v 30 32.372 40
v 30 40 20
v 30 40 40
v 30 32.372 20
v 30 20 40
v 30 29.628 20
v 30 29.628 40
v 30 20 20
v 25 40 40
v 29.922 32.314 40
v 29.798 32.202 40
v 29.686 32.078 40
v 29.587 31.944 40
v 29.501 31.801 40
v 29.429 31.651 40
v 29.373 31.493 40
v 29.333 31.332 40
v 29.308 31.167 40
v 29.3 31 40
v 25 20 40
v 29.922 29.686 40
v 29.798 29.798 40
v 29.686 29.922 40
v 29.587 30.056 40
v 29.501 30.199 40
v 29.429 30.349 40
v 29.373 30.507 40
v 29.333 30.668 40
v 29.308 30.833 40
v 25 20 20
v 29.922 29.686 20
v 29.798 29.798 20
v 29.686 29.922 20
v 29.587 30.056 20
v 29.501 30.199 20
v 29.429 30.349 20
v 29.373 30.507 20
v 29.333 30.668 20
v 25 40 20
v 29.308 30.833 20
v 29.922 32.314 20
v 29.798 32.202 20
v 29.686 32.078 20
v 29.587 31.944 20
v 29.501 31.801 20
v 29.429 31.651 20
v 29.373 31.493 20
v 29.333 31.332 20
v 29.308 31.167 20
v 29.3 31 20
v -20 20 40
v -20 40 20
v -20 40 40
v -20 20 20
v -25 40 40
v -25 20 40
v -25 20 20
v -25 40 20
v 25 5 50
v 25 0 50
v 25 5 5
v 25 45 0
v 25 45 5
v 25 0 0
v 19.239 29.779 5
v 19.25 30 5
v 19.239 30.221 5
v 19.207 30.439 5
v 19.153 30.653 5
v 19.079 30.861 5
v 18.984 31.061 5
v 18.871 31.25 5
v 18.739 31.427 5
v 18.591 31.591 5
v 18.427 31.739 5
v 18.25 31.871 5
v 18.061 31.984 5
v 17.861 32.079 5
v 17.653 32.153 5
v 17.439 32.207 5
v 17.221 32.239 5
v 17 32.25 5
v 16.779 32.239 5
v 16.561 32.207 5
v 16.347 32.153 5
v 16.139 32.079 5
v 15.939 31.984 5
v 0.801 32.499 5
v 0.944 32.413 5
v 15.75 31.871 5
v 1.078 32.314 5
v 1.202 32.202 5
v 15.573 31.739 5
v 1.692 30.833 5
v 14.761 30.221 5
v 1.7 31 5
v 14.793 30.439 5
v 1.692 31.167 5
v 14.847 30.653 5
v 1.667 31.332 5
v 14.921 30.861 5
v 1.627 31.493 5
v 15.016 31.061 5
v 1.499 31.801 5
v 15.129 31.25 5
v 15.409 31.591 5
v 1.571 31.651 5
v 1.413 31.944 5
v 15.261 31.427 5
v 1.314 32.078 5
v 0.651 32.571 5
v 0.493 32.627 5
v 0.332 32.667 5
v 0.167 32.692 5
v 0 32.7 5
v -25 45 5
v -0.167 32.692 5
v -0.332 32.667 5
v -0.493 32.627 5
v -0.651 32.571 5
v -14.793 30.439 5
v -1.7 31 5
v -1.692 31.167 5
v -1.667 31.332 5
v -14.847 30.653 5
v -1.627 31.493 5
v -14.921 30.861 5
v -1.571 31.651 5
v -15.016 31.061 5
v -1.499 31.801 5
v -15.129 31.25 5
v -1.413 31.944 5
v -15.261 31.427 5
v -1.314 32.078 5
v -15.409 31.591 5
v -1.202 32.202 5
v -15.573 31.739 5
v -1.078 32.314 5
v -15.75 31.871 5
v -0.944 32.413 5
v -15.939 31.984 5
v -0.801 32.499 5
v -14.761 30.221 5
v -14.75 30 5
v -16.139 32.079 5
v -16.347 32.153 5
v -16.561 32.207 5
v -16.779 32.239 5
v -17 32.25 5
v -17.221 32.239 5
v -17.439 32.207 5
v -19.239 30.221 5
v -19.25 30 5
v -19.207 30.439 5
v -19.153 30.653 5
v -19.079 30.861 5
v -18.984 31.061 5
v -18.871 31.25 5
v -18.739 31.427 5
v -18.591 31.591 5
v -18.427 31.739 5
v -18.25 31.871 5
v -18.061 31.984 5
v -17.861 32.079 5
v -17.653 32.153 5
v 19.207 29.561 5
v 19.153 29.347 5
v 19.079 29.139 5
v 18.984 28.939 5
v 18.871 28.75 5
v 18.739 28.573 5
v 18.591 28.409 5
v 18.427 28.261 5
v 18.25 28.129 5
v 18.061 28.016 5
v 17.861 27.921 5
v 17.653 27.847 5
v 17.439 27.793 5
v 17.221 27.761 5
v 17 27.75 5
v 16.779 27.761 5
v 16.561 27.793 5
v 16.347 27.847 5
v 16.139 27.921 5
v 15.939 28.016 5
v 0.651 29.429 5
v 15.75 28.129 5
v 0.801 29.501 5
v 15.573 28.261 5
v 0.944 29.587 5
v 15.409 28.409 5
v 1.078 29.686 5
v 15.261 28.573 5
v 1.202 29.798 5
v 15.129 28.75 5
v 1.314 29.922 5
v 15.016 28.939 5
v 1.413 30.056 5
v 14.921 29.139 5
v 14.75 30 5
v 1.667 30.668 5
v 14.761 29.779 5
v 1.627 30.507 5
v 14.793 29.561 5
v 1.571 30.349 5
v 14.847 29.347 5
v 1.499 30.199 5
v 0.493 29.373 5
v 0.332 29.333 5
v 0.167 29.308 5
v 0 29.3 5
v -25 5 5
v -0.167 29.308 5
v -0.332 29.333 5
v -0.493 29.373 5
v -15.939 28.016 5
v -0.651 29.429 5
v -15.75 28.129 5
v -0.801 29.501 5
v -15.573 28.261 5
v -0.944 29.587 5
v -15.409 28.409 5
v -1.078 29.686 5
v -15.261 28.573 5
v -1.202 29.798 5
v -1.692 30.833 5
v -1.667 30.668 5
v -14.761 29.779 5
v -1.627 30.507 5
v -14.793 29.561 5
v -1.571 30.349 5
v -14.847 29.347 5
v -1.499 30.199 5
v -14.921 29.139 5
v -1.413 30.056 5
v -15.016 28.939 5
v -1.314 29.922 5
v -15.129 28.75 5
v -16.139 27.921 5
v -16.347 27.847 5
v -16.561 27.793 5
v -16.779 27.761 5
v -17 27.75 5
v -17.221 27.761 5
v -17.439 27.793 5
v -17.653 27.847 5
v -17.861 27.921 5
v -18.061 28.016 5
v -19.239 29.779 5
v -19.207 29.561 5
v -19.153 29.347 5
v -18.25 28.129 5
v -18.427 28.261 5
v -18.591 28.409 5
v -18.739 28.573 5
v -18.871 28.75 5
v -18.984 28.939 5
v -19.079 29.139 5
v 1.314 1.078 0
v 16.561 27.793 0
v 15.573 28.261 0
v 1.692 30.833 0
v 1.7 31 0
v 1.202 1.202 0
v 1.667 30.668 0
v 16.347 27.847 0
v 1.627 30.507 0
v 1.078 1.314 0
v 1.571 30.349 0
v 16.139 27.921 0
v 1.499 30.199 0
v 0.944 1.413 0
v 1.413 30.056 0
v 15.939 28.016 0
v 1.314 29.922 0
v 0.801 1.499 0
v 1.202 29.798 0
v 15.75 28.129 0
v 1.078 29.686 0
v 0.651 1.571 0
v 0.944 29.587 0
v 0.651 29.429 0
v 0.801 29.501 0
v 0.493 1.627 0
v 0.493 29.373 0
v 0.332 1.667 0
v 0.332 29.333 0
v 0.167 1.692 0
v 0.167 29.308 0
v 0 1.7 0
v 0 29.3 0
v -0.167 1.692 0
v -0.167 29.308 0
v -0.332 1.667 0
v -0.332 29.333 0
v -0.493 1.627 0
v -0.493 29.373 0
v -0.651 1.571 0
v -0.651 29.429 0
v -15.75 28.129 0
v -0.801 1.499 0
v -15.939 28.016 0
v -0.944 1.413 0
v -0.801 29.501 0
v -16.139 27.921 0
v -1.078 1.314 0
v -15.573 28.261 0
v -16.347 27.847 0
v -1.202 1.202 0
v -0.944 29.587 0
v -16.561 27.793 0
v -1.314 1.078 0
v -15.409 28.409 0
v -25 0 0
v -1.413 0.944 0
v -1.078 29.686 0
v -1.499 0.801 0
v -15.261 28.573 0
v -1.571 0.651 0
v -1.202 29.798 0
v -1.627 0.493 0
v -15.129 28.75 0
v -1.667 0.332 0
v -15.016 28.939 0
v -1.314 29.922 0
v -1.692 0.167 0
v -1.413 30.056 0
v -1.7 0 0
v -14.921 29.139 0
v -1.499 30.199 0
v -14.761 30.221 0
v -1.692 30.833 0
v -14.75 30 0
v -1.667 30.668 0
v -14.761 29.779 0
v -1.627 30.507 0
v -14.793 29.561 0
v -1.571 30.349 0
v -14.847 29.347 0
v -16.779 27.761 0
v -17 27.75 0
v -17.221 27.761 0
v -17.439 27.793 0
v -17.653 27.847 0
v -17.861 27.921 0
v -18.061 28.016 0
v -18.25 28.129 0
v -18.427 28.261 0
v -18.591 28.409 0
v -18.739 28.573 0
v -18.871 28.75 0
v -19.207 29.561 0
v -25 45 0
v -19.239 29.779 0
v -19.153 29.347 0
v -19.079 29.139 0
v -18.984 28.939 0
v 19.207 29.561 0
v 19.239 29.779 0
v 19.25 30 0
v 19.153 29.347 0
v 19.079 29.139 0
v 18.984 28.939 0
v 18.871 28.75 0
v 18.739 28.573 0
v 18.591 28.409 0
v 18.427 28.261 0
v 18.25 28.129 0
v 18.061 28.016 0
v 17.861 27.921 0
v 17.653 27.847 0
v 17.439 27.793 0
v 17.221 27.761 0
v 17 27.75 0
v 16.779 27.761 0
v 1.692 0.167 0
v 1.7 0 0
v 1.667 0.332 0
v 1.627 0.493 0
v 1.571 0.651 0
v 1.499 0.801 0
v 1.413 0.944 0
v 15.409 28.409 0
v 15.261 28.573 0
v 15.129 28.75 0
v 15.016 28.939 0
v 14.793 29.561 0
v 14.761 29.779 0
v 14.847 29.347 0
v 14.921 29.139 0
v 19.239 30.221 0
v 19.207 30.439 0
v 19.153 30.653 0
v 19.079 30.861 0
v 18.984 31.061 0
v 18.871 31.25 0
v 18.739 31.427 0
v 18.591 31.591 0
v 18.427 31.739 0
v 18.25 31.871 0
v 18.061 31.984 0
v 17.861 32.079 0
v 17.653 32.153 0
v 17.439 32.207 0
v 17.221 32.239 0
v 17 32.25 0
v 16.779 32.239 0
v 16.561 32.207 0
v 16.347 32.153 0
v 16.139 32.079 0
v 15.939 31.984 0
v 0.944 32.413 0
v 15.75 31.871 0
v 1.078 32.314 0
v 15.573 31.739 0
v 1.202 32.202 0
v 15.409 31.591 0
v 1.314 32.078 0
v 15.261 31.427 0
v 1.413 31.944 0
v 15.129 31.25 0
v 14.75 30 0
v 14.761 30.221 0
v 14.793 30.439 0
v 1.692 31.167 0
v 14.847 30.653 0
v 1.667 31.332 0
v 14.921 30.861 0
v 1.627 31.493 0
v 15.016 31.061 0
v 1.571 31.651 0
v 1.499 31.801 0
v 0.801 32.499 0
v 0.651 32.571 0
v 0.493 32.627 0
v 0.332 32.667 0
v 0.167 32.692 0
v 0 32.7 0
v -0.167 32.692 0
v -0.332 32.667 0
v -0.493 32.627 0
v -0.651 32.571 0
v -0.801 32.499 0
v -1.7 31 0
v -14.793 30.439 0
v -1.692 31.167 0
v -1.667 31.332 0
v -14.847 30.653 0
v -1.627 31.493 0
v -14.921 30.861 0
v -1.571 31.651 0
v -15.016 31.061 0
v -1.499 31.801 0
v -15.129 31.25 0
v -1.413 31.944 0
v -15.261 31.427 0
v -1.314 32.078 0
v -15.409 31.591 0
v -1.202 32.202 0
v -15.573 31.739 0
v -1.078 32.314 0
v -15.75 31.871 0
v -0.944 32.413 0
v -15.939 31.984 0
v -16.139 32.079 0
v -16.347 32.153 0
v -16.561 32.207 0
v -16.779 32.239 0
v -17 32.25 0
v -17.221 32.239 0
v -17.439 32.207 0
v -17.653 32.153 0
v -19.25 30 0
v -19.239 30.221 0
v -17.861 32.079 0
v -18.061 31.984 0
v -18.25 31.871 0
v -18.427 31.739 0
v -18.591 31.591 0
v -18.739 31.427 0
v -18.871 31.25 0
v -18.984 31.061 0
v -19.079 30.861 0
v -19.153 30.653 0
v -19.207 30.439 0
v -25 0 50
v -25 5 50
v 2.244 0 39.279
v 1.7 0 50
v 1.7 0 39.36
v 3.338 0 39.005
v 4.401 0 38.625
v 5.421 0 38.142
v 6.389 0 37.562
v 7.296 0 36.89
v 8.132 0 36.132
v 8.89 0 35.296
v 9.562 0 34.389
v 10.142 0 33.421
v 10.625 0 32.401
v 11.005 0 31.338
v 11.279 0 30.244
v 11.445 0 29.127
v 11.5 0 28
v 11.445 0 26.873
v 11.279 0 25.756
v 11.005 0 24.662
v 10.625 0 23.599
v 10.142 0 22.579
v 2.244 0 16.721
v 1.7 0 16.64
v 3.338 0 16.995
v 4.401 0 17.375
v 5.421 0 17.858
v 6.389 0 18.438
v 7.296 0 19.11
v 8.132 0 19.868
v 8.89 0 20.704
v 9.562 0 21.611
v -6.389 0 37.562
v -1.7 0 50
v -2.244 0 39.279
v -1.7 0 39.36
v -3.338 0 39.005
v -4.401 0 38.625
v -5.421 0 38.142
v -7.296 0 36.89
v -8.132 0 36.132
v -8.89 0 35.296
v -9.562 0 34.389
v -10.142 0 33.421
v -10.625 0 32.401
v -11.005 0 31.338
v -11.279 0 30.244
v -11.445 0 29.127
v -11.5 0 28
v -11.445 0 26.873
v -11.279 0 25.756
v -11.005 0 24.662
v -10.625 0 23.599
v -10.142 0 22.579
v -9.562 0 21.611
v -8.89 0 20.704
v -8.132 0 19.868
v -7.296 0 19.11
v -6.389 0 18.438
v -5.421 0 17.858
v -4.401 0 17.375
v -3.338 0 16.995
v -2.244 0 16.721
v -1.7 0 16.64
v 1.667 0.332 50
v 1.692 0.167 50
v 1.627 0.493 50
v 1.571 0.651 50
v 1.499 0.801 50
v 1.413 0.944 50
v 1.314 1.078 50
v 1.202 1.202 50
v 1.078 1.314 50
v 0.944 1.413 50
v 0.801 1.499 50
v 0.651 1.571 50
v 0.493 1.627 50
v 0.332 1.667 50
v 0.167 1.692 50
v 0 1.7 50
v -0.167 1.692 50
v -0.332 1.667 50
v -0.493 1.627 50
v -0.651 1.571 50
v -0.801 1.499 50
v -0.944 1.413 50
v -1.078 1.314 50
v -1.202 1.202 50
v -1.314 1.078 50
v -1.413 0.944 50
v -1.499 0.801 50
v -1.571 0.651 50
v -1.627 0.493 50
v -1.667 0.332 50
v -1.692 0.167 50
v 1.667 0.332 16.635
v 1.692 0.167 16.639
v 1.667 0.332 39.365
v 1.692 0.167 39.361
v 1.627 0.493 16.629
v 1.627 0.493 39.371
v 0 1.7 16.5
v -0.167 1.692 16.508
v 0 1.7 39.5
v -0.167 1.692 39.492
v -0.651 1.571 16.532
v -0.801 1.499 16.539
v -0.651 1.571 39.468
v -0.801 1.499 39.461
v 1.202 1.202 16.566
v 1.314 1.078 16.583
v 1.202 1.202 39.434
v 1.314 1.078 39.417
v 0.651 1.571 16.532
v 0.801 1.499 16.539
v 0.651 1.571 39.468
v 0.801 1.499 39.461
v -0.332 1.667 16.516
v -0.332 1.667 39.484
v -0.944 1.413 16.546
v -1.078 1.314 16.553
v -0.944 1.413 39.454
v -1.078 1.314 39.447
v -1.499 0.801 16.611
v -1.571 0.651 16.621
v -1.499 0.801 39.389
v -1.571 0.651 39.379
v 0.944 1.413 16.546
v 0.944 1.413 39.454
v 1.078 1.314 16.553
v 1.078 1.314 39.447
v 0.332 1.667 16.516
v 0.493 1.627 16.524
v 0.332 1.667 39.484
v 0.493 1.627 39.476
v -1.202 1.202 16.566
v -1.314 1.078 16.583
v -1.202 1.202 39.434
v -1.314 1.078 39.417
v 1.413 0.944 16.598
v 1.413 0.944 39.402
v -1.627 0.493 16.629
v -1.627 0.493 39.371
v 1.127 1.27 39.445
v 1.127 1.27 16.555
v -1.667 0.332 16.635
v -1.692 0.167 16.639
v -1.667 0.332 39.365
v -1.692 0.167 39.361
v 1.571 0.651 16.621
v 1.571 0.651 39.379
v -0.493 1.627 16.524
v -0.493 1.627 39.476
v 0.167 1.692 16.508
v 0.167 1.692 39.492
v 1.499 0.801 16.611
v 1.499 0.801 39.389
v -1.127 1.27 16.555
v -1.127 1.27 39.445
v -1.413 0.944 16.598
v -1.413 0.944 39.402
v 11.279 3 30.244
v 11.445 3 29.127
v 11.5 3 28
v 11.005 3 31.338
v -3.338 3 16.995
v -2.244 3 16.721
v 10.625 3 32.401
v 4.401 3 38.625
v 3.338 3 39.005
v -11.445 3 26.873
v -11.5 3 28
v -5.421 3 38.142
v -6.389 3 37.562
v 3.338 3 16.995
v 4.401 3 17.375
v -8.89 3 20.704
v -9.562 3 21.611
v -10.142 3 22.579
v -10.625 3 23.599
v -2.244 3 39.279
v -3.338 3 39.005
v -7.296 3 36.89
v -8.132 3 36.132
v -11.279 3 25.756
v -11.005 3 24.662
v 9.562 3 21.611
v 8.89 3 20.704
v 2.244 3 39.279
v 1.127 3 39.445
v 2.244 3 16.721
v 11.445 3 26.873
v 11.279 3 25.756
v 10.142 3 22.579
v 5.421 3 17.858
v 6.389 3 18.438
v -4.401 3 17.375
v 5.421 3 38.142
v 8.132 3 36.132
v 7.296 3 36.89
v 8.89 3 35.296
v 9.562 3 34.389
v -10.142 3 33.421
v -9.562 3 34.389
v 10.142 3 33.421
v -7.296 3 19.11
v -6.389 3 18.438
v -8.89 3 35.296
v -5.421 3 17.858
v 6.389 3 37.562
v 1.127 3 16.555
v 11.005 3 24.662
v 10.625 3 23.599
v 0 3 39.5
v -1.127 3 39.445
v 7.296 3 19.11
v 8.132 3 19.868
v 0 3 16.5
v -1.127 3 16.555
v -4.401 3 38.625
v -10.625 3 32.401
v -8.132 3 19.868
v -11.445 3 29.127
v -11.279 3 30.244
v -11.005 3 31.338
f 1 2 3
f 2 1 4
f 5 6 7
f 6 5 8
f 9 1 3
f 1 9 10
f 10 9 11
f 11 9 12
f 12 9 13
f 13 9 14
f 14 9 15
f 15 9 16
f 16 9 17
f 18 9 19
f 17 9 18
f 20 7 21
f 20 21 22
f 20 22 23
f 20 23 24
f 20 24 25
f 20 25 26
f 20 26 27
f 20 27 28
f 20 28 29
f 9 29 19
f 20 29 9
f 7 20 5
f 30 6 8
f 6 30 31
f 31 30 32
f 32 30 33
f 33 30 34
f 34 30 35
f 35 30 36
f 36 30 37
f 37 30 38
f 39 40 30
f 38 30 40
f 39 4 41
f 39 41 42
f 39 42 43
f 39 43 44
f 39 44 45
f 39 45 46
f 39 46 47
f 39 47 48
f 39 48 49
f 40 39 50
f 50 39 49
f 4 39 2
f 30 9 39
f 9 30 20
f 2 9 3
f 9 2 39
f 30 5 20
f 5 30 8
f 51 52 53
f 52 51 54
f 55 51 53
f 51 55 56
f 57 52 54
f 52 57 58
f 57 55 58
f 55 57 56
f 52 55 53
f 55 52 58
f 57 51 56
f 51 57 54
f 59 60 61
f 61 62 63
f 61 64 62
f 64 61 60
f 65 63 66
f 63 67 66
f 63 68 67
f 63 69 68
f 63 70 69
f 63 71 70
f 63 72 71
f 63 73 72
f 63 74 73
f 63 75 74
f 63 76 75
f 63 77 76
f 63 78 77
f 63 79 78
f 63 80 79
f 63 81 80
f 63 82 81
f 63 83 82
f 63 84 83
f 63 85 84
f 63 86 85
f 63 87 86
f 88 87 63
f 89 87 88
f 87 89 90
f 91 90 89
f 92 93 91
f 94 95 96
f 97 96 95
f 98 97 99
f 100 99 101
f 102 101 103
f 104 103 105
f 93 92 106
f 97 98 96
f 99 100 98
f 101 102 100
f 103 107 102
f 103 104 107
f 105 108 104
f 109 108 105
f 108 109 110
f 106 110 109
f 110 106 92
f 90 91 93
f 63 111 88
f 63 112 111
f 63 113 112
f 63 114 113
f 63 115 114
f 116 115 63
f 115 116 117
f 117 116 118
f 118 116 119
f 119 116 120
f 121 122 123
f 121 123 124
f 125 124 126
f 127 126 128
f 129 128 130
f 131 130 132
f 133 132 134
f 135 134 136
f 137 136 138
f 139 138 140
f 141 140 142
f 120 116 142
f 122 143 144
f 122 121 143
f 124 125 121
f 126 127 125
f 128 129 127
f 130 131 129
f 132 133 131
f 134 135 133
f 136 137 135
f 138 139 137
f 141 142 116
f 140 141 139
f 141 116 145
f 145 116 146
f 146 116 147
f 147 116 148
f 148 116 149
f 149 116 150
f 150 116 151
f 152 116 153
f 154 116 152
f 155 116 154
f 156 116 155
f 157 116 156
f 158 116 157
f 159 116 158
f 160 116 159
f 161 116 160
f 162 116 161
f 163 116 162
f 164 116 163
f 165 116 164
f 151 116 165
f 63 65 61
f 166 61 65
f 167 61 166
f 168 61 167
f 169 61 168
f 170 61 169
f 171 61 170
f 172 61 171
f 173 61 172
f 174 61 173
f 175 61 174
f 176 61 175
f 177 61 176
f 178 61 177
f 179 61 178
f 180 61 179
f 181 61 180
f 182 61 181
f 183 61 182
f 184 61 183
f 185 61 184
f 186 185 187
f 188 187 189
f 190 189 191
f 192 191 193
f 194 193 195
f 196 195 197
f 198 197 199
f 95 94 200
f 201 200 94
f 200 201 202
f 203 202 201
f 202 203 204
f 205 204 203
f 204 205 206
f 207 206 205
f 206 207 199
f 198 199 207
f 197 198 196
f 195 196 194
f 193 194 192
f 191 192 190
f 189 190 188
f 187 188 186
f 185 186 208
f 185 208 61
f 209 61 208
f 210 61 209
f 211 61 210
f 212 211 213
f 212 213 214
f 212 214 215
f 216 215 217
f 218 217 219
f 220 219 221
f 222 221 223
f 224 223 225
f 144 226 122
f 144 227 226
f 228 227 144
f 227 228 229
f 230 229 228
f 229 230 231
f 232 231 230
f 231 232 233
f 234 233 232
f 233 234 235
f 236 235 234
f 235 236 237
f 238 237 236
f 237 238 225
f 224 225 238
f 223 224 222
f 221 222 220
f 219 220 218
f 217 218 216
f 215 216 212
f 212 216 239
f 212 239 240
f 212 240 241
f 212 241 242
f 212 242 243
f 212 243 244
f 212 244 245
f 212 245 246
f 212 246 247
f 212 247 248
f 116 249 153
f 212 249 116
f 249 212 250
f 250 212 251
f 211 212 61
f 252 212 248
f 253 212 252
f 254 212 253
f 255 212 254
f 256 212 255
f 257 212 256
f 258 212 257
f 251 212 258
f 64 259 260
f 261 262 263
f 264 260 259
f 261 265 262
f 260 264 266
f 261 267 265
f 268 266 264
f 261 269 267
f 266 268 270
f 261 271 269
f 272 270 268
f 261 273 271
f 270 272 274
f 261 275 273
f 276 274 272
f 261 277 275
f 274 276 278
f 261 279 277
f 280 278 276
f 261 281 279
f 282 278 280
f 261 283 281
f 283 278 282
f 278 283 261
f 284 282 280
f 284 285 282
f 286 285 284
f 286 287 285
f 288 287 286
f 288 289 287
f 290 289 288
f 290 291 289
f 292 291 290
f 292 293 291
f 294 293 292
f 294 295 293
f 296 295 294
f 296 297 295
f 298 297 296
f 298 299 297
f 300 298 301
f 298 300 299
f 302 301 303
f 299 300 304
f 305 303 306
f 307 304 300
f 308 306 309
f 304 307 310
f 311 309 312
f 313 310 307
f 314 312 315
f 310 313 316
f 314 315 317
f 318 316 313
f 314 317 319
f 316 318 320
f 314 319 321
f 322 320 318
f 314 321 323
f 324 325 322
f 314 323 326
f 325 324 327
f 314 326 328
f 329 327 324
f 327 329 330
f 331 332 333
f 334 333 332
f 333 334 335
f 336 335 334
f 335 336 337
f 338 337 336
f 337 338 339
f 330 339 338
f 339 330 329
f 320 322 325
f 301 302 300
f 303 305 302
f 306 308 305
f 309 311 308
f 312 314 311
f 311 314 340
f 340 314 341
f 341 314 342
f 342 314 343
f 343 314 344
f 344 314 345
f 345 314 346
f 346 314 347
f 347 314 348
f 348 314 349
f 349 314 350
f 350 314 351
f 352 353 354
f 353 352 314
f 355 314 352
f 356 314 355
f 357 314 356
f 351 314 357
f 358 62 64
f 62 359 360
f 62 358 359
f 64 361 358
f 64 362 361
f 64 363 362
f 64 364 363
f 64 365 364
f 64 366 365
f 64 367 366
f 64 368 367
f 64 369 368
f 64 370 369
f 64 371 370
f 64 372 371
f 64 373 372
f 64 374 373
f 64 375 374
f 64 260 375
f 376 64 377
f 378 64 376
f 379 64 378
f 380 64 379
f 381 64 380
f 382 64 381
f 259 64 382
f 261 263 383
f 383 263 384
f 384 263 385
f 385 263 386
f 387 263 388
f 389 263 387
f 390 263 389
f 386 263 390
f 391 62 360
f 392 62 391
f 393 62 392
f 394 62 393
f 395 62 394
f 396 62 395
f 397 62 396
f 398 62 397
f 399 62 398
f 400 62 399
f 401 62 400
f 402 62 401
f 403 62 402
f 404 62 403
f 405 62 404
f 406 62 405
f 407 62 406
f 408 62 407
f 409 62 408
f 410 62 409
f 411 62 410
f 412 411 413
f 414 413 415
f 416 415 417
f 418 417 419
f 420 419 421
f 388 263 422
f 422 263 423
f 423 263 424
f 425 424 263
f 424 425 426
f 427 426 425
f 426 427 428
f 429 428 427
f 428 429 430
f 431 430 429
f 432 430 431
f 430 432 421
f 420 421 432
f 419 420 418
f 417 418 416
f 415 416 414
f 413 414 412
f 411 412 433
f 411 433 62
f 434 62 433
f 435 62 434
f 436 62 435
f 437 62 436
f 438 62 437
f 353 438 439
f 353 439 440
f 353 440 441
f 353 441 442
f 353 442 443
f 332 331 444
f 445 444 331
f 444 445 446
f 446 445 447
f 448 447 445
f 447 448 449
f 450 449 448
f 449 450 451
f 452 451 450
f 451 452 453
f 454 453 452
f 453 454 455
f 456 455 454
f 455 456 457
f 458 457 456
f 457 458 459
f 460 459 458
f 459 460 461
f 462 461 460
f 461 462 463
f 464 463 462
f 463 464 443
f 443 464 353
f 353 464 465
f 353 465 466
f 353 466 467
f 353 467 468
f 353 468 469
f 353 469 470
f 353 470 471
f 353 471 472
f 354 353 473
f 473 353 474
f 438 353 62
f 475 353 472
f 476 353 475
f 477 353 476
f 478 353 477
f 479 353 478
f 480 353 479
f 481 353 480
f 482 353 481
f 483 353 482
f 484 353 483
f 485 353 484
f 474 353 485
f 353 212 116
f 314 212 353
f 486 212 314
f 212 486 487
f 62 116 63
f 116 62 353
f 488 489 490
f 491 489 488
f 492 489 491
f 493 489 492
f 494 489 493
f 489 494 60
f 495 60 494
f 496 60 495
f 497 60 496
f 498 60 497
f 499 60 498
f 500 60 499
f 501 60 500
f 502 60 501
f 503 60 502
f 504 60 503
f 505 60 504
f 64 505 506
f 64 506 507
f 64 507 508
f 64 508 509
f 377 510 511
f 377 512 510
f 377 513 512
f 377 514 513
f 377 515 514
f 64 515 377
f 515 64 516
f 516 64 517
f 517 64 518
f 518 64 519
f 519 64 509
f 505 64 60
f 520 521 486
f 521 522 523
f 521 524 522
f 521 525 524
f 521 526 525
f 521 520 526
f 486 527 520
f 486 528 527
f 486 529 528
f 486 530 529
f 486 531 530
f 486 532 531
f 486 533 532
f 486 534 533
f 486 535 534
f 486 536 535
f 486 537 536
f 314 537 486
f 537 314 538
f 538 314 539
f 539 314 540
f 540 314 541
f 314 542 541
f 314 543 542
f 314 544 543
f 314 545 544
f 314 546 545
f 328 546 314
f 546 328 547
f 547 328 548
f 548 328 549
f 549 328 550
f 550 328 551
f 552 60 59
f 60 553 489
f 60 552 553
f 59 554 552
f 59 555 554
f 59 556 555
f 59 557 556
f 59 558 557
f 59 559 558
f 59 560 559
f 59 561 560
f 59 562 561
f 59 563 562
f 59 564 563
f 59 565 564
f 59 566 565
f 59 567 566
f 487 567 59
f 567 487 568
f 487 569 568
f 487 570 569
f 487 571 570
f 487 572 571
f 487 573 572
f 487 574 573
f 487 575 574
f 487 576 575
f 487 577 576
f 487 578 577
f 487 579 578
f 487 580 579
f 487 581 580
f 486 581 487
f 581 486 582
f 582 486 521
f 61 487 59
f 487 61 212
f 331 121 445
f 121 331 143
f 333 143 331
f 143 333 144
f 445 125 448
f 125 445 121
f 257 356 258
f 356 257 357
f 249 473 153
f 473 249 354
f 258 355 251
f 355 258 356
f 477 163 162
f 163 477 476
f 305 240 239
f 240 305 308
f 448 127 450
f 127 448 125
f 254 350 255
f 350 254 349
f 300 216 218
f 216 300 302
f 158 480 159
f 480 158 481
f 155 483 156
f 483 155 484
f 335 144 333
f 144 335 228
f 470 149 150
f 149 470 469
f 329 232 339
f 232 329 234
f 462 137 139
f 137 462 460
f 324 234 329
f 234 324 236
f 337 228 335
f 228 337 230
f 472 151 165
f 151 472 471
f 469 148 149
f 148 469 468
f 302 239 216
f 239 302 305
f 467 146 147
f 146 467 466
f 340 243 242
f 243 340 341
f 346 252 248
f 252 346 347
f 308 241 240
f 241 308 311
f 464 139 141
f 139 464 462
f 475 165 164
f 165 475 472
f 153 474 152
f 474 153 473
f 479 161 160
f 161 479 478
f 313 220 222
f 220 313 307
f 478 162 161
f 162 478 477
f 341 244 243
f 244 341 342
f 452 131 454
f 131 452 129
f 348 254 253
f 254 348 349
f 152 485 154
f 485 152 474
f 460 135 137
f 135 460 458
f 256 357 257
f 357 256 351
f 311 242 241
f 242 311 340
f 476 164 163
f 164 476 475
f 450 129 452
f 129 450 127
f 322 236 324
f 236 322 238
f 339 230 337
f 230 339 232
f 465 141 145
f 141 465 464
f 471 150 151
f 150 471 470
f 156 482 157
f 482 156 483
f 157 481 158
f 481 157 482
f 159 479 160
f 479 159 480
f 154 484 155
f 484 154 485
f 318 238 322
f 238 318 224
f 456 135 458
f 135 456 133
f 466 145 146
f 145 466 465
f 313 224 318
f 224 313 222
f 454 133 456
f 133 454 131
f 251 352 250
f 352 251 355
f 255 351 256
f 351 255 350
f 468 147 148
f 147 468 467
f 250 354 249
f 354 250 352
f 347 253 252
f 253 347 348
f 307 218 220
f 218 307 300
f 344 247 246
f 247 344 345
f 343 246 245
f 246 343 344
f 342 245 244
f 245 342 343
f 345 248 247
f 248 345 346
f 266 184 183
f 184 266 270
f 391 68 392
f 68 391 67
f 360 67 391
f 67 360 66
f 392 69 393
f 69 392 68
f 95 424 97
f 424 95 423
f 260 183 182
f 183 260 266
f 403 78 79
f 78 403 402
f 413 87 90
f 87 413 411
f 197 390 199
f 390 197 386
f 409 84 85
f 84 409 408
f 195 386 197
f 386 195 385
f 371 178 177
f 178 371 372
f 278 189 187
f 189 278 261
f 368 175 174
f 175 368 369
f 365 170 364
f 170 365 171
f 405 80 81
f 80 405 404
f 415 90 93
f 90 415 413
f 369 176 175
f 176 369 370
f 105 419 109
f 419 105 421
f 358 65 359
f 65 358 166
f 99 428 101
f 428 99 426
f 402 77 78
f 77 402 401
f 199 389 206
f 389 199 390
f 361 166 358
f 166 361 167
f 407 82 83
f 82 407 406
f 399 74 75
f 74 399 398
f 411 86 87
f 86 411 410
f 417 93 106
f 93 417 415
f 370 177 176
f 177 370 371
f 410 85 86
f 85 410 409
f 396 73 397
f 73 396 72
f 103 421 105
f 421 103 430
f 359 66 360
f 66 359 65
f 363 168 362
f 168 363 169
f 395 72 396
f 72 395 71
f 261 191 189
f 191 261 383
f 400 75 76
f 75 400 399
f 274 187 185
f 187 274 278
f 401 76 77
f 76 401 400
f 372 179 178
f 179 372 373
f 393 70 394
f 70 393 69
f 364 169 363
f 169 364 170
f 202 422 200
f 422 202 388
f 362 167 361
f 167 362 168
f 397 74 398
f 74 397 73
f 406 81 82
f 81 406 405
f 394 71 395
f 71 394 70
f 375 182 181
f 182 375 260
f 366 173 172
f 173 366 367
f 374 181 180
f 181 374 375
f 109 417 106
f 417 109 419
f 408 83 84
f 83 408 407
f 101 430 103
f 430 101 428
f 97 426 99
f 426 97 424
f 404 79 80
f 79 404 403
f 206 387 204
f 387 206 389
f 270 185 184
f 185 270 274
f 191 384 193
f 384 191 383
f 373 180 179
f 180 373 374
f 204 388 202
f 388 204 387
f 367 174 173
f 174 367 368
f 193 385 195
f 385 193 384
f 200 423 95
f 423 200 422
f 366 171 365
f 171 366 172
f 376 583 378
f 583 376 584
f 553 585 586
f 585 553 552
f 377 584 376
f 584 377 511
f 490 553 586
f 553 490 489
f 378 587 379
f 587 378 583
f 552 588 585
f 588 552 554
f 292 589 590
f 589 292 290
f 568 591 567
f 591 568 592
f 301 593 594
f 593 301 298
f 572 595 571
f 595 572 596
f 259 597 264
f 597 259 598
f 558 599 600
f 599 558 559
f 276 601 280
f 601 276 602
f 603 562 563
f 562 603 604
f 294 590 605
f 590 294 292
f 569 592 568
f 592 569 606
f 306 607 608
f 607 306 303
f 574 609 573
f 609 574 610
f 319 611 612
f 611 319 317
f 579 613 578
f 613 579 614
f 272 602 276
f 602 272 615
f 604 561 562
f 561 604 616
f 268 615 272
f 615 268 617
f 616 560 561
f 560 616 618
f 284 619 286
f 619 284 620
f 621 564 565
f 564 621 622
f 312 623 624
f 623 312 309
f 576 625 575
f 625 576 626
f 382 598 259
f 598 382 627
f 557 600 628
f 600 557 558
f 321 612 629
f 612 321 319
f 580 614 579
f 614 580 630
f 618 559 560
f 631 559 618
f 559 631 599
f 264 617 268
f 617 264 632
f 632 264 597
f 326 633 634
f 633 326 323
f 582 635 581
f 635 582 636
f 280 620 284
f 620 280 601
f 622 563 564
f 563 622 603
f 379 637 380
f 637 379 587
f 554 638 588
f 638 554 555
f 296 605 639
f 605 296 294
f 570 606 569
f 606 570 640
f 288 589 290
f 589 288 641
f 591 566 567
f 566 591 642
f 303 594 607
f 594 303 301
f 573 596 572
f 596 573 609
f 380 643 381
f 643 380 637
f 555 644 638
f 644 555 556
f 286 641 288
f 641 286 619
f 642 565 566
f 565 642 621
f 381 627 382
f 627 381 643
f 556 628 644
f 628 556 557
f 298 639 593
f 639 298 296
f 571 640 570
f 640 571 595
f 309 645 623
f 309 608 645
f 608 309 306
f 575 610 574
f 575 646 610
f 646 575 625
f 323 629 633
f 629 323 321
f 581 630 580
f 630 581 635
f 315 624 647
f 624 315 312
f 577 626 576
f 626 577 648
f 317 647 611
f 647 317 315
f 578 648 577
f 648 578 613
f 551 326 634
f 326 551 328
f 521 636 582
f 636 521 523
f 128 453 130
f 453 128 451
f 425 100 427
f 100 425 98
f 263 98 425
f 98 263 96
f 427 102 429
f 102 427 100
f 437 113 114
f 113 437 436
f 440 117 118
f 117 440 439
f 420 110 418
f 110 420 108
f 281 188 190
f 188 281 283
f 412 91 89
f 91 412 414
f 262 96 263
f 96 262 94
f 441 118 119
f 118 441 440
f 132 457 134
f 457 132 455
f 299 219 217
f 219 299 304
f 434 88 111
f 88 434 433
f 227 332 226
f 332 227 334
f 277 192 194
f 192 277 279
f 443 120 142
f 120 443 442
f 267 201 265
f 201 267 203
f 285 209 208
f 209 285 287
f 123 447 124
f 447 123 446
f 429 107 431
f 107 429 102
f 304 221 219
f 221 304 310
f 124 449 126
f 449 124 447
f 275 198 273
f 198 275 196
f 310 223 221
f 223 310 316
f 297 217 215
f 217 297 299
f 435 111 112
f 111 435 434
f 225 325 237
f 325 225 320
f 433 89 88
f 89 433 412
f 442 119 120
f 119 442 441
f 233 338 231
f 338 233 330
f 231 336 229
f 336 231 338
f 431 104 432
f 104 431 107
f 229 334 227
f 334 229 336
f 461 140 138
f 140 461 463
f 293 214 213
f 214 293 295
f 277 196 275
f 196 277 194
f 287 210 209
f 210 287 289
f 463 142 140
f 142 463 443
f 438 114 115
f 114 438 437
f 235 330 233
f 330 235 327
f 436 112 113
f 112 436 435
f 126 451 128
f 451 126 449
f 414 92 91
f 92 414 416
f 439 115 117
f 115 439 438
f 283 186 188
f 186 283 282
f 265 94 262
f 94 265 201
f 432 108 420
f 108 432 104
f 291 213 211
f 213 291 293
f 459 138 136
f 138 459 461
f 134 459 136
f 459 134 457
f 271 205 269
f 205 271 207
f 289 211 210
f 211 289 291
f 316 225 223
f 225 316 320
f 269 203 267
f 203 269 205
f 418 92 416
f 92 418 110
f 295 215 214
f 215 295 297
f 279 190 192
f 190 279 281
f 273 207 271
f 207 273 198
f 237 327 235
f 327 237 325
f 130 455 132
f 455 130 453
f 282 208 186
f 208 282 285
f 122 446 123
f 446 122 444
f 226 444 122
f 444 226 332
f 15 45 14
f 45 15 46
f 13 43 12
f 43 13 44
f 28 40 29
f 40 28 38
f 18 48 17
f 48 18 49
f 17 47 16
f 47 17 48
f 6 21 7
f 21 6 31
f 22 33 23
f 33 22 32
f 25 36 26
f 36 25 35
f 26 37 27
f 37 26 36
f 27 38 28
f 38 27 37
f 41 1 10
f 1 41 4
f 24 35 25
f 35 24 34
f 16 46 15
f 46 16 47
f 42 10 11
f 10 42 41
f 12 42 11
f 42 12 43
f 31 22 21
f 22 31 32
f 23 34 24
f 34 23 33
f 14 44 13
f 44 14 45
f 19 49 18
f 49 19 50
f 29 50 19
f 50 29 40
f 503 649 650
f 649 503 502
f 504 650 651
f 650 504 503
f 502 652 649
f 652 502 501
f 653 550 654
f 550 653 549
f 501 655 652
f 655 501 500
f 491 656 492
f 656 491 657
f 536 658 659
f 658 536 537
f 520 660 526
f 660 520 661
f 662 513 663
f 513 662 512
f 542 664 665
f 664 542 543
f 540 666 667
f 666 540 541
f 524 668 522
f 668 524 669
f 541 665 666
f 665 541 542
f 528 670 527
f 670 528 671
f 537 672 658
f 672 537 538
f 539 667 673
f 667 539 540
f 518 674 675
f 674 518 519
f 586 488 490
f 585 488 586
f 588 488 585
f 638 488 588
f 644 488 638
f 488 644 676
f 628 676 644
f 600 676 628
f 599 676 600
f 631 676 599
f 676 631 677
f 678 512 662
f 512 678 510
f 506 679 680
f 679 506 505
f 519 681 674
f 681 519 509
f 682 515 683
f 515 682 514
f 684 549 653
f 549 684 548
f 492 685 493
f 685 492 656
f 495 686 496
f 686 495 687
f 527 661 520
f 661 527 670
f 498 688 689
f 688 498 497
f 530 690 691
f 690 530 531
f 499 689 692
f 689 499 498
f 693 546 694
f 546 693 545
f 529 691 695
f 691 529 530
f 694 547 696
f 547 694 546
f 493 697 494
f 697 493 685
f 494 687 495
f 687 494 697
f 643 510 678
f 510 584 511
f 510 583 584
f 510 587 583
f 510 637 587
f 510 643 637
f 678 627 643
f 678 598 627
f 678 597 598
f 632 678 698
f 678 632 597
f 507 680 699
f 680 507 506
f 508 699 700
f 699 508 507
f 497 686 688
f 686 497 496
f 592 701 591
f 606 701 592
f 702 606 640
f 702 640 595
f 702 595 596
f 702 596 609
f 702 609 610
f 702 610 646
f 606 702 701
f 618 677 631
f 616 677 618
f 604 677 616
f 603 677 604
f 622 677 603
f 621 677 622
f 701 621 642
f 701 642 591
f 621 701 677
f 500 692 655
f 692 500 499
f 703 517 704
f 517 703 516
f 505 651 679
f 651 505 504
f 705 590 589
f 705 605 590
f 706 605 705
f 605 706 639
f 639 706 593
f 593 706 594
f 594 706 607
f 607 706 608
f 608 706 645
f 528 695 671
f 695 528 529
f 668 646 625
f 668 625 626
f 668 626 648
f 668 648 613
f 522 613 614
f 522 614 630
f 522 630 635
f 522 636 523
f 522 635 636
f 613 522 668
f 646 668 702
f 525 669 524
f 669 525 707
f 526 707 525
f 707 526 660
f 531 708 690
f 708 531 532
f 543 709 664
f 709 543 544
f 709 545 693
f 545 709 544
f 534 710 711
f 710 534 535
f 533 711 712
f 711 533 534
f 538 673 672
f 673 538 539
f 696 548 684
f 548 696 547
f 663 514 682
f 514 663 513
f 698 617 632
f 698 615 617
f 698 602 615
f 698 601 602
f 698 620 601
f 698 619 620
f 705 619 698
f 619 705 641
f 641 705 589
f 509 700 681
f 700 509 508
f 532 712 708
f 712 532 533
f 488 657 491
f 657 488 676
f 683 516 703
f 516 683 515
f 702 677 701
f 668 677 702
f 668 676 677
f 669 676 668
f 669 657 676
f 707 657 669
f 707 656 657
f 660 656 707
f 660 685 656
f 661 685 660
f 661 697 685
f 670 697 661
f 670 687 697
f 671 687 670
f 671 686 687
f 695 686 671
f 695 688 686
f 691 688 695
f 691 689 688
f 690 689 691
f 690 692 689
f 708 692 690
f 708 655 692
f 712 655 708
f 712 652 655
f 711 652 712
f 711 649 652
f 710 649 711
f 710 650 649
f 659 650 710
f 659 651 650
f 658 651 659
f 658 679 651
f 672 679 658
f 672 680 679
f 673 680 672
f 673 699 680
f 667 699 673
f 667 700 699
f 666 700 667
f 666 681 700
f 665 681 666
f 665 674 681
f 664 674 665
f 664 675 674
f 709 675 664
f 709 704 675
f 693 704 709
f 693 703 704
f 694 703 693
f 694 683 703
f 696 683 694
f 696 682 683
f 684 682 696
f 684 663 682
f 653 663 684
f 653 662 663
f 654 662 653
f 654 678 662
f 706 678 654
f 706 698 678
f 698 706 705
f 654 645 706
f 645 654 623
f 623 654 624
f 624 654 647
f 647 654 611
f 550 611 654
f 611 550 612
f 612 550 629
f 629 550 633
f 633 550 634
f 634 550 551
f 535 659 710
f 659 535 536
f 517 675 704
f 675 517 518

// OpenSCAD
// L-shaped mounting bracket for NEMA 17 stepper motor
// Print orientation: base plate on bed (z = 0), motor plate builds upward (+Z)
// Positioned per user coordinates (x -25 to 25, y 0 to 45), not centred

// ---------------- Parameters ----------------
base_x0      = -25;   // base plate x start
base_x1      = 25;    // base plate x end
base_y0      = 0;     // base plate y start
base_y1      = 45;    // base plate y end
base_z0      = 0;     // base plate z start
base_z1      = 5;     // base plate z end

hole_m4_x1   = -17;   // M4 hole 1 x position
hole_m4_y1   = 30;    // M4 hole 1 y position
hole_m4_x2   = 17;    // M4 hole 2 x position
hole_m4_y2   = 30;    // M4 hole 2 y position
hole_m4      = 4.5;   // M4 hole diameter

motor_x0     = -25;   // motor plate x start
motor_x1     = 25;    // motor plate x end
motor_y0     = 0;     // motor plate y start
motor_y1     = 5;     // motor plate y end
motor_z0     = 0;     // motor plate z start (on base top)
motor_z1     = 50;    // motor plate z end

boss_hole    = 23;    // motor centring boss hole diameter
boss_hole_x  = 0;     // boss hole centre x
boss_hole_z  = 28;    // boss hole centre z

screw_hole   = 3.4;   // M3 screw hole diameter
screw_pitch  = 31;    // square pattern side length
screw_count  = 4;     // number of screw holes

gusset_t     = 5;     // gusset thickness (X)
gusset_leg   = 20;    // right triangle leg length (Y and Z)
gusset_x0    = -25;   // left gusset x start
gusset_x1    = -20;   // left gusset x end
gusset_x2    = 20;    // right gusset x start
gusset_x3    = 25;    // right gusset x end

eps          = 0.5;   // cutter overshoot past faces

$fn = 64;

// ---------------- Model ----------------
difference() {
    union() {
        // Base plate
        translate([base_x0, base_y0, base_z0])
            cube([base_x1 - base_x0, base_y1 - base_y0, base_z1 - base_z0]);

        // Vertical motor plate, standing on the back edge of the base
        translate([motor_x0, motor_y0, motor_z0])
            cube([motor_x1 - motor_x0, motor_y1 - motor_y0, motor_z1 - motor_z0]);

        // Triangular gussets, flush with left and right edges
        for (sx = [-1, 1])
            translate([sx * gusset_x0, gusset_leg_leg(), gusset_leg_leg()])
                cube([gusset_t, gusset_leg, gusset_leg]);
    }

    // Base plate through-holes (M4)
    for (x = [hole_m4_x1, hole_m4_x2])
        for (y = [hole_m4_y1, hole_m4_y2])
            translate([x, y, -eps])
                cylinder(d = hole_m4, h = base_z1 + 2 * eps);

    // Motor plate boss hole (along Y)
    translate([boss_hole_x, 0, boss_hole_z])
        rotate([90, 0, 0])
            cylinder(d = boss_hole, h = motor_y1 - motor_y0 + 2 * eps, center = true);

    // M3 screw holes on square pattern, centred on boss hole
    for (i = [0 : screw_count - 1])
        for (j = [0 : screw_count - 1]) {
            x = -screw_pitch / 2 + (i - (screw_count - 1) / 2) * screw_pitch;
            y = -screw_pitch / 2 + (j - (screw_count - 1) / 2) * screw_pitch;
            translate([x, y, -eps])
                cylinder(d = screw_hole, h = motor_z1 - motor_z0 + 2 * eps);
        }
}

// Helper: returns leg length for triangle at y = 5, z = 5 (right angle corner)
// Positioned so the gusset spans 20 mm along +Y and 20 mm along +Z
function gusset_leg_leg() = gusset_leg;
